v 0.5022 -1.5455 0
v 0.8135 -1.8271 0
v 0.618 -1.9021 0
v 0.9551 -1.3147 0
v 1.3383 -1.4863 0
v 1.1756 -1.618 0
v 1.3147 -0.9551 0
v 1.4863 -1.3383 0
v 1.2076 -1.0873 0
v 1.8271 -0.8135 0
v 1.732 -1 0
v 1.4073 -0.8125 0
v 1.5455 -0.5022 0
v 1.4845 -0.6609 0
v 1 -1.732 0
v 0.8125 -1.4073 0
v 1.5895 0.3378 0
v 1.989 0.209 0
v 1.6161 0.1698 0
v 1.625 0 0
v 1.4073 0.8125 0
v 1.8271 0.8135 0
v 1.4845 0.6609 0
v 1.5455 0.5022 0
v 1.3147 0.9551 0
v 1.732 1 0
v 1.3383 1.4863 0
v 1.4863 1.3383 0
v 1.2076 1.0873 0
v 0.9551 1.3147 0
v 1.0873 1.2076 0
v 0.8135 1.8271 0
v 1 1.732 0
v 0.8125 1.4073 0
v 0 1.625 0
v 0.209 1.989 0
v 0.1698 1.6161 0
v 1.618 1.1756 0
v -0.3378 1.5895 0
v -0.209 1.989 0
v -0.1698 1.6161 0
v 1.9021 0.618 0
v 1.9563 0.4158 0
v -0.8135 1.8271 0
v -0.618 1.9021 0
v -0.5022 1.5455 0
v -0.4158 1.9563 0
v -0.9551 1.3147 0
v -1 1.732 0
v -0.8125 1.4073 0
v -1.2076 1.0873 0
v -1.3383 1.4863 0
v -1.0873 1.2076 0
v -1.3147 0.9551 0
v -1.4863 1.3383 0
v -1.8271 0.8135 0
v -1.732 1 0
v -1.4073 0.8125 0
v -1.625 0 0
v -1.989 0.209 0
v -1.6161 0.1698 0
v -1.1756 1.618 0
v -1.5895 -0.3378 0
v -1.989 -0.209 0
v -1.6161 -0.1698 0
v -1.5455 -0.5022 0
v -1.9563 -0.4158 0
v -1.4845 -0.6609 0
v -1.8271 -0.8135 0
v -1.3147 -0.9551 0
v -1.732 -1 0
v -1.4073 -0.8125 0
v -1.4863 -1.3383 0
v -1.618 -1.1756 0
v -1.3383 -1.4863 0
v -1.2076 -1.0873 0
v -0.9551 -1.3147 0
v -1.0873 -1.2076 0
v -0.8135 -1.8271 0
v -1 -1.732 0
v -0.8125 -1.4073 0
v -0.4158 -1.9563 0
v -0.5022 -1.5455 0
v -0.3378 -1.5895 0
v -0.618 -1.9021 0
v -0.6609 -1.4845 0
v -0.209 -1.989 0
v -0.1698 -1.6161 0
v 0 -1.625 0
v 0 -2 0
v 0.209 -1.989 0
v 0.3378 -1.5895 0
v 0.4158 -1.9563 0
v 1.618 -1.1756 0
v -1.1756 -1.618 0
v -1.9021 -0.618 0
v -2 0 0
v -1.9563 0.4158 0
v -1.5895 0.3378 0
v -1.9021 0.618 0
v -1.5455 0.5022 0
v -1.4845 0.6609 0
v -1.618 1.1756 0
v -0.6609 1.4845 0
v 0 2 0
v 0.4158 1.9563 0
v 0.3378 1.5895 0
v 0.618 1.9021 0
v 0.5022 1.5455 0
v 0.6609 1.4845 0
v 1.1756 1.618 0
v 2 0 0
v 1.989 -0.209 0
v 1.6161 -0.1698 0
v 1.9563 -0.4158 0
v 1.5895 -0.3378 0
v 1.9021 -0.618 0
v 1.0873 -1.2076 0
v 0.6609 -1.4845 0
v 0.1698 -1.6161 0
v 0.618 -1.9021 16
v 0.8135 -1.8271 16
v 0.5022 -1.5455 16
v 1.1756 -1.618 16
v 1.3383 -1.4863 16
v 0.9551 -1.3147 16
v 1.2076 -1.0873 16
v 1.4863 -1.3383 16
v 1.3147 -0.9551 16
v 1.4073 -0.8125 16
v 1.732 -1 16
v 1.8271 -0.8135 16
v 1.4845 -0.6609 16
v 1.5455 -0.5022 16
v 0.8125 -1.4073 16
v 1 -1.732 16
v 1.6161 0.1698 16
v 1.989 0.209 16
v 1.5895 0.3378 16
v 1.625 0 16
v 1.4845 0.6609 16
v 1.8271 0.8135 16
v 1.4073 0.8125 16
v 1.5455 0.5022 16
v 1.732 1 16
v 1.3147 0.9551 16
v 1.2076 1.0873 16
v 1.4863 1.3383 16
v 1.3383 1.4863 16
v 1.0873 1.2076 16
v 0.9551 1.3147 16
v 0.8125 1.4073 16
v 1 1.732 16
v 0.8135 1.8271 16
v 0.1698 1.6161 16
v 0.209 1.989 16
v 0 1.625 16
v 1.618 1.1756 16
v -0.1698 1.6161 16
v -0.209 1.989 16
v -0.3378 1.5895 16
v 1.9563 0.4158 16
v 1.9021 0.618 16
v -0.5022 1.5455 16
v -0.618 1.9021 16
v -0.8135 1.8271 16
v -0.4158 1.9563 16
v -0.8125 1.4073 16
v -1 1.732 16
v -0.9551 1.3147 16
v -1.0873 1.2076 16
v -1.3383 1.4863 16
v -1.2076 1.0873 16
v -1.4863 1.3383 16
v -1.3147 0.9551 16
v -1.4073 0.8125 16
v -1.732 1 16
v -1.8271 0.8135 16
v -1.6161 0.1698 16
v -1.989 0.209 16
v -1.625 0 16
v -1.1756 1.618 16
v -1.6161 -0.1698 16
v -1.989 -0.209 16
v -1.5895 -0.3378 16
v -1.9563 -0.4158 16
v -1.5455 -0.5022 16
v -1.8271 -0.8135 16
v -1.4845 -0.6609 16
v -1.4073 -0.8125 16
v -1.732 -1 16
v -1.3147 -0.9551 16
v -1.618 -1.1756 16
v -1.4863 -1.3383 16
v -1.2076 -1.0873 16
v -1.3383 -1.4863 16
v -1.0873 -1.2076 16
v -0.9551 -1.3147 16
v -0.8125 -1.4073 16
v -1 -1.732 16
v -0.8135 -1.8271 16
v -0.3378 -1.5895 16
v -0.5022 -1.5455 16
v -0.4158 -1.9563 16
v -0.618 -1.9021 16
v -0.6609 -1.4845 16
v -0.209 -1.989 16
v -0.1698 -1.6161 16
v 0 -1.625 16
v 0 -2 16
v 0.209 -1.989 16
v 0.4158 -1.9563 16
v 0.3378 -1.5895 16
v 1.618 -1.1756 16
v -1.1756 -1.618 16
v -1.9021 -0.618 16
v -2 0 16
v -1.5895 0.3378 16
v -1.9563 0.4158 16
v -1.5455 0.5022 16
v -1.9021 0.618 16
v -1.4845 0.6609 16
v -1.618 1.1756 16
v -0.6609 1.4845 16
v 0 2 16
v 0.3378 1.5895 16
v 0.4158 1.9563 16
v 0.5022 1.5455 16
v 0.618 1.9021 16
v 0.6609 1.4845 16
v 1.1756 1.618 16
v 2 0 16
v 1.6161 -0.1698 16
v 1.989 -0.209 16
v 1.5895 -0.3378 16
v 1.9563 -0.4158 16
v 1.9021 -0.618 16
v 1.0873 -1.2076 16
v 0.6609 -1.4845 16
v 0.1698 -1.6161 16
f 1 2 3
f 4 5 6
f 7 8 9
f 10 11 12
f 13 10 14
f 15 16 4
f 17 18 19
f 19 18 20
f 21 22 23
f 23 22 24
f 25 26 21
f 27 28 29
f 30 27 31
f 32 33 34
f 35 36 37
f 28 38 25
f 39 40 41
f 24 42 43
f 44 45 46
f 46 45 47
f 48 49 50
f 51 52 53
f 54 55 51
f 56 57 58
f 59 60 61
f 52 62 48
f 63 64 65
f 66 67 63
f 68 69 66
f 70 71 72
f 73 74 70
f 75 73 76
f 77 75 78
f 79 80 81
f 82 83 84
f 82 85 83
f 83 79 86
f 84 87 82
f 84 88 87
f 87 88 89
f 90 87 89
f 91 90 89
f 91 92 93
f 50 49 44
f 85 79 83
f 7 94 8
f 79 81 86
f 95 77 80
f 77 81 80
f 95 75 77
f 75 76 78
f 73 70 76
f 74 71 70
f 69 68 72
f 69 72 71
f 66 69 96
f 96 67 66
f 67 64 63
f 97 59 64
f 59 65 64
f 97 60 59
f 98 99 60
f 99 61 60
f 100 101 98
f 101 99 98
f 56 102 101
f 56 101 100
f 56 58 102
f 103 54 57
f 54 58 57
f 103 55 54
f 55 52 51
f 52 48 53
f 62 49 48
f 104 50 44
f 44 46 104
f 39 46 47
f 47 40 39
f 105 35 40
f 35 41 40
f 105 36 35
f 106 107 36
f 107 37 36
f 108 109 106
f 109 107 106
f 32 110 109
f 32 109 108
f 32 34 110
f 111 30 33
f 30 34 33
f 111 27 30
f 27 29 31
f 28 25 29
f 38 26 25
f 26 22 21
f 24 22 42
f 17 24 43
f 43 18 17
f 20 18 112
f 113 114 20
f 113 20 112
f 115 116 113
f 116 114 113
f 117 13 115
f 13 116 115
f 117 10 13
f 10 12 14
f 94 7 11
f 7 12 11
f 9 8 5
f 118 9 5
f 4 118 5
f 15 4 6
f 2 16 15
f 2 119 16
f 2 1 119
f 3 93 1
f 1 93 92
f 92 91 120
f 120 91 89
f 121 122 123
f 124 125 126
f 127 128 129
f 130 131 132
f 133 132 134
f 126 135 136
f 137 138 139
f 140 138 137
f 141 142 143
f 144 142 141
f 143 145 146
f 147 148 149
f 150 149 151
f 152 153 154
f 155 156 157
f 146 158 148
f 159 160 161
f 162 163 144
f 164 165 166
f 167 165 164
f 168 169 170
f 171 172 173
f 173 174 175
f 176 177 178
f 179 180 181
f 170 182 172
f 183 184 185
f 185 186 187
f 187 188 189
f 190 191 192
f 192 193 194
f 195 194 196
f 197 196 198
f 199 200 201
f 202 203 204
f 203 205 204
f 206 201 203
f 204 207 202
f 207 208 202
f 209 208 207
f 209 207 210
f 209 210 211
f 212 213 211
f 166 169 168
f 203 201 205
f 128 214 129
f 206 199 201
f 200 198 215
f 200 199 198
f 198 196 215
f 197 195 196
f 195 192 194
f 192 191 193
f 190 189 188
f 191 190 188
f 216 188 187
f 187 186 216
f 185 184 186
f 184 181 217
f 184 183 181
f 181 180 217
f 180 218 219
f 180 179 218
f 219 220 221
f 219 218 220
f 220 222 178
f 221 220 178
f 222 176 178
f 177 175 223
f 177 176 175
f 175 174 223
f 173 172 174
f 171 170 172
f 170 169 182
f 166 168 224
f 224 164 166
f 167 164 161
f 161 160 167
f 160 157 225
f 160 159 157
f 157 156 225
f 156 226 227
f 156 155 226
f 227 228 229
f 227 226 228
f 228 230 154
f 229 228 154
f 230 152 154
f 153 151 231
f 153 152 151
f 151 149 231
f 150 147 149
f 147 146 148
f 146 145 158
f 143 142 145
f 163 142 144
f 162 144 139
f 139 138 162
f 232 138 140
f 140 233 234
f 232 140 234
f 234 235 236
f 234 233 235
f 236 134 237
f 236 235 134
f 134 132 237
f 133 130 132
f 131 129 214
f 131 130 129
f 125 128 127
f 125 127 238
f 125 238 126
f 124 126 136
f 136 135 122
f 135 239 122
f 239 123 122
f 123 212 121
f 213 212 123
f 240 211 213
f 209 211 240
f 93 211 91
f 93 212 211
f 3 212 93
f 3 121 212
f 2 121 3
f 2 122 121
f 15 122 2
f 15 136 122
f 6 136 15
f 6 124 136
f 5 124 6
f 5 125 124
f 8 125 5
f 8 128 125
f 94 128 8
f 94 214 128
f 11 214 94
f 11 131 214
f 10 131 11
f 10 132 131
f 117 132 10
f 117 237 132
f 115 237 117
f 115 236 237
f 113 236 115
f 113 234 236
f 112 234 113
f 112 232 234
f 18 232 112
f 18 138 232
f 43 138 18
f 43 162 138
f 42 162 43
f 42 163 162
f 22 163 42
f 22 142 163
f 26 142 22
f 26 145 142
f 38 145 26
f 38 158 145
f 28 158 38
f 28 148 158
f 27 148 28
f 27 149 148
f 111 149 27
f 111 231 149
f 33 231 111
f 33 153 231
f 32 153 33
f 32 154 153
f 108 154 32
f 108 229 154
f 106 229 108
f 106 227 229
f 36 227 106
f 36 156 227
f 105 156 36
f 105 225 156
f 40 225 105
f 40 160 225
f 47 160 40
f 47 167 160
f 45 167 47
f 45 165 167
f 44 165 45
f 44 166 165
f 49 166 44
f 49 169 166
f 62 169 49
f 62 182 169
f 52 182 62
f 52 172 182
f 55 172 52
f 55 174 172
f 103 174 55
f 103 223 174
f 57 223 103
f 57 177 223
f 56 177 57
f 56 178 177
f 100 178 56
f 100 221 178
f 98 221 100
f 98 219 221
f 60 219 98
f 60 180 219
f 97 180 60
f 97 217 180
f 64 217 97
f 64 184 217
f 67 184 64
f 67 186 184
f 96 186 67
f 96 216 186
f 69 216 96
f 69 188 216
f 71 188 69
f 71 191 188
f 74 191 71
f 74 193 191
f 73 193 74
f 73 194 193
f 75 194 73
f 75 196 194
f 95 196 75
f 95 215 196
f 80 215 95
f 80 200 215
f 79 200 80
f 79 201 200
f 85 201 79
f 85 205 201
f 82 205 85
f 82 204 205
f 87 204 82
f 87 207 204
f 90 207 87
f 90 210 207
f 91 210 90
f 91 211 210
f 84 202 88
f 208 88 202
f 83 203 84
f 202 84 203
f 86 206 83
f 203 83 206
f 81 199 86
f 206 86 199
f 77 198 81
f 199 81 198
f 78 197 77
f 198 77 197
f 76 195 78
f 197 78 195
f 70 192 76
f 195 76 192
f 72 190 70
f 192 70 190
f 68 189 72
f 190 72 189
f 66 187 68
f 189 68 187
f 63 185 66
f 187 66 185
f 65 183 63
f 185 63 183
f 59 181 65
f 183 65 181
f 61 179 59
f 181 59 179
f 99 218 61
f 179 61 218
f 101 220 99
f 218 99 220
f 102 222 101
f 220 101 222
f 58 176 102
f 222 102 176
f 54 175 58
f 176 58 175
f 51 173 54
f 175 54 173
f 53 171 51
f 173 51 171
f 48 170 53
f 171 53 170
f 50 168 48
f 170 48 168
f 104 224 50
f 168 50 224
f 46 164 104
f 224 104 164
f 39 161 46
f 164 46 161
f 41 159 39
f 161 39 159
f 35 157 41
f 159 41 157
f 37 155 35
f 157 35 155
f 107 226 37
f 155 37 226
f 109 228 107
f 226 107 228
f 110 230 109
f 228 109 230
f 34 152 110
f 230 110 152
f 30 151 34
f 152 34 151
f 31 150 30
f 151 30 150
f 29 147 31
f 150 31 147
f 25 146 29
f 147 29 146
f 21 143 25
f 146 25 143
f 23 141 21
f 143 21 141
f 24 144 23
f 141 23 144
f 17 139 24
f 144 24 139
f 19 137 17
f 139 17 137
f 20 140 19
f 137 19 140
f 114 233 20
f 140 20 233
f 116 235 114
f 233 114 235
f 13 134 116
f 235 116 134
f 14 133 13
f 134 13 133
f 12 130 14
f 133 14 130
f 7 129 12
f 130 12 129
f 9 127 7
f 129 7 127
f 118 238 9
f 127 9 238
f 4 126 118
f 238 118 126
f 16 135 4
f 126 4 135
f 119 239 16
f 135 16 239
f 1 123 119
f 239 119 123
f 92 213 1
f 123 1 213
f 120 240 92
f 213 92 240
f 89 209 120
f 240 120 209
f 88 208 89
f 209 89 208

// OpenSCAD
$fn=60;
build("Tube");
module build(shape)
{
    if(shape == "ScrewHole")
    {
         ScrewHole(height=16, od=4, id=3.25, insetDiameter=9.25);
    }
    if(shape == "Tube")
    {
        Tube(od=4, id=3.25, length=16);
    }
    if(shape == "ConeHollow")
    {
        ConeHollow(od1=8, od2=4, wall=2, height=16);
    }
}


module ScrewHole(height, od, id, insetDiameter)
{
    echo("ScrewHole", height=height, od=od, id=id, insetDiameter=insetDiameter);
    //translate([0, 0, height+1])
    rotate([0, 180, 0]) 
    {
        wall = od - id;
        cylinder(h=height + 1, d1=od, d2=od);;
        if(insetDiameter > id)
        {
            cylinder(h=insetDiameter, d1 = insetDiameter, d2 = 1);
        }
    }
}

module Tube(od, id, length)
{
    linear_extrude(height=length)
    {
        difference()
        {
            circle(r=od/2);
            circle(r=id/2);
        }
    }
}

module ConeHollow(od1, od2, wall, height)
{
    {
        difference()
        {
            cylinder(d1=od1, d2=od2, h=height);
            cylinder(d1=od1-wall, d2=od2-wall, h=height);
        }
    }
}
